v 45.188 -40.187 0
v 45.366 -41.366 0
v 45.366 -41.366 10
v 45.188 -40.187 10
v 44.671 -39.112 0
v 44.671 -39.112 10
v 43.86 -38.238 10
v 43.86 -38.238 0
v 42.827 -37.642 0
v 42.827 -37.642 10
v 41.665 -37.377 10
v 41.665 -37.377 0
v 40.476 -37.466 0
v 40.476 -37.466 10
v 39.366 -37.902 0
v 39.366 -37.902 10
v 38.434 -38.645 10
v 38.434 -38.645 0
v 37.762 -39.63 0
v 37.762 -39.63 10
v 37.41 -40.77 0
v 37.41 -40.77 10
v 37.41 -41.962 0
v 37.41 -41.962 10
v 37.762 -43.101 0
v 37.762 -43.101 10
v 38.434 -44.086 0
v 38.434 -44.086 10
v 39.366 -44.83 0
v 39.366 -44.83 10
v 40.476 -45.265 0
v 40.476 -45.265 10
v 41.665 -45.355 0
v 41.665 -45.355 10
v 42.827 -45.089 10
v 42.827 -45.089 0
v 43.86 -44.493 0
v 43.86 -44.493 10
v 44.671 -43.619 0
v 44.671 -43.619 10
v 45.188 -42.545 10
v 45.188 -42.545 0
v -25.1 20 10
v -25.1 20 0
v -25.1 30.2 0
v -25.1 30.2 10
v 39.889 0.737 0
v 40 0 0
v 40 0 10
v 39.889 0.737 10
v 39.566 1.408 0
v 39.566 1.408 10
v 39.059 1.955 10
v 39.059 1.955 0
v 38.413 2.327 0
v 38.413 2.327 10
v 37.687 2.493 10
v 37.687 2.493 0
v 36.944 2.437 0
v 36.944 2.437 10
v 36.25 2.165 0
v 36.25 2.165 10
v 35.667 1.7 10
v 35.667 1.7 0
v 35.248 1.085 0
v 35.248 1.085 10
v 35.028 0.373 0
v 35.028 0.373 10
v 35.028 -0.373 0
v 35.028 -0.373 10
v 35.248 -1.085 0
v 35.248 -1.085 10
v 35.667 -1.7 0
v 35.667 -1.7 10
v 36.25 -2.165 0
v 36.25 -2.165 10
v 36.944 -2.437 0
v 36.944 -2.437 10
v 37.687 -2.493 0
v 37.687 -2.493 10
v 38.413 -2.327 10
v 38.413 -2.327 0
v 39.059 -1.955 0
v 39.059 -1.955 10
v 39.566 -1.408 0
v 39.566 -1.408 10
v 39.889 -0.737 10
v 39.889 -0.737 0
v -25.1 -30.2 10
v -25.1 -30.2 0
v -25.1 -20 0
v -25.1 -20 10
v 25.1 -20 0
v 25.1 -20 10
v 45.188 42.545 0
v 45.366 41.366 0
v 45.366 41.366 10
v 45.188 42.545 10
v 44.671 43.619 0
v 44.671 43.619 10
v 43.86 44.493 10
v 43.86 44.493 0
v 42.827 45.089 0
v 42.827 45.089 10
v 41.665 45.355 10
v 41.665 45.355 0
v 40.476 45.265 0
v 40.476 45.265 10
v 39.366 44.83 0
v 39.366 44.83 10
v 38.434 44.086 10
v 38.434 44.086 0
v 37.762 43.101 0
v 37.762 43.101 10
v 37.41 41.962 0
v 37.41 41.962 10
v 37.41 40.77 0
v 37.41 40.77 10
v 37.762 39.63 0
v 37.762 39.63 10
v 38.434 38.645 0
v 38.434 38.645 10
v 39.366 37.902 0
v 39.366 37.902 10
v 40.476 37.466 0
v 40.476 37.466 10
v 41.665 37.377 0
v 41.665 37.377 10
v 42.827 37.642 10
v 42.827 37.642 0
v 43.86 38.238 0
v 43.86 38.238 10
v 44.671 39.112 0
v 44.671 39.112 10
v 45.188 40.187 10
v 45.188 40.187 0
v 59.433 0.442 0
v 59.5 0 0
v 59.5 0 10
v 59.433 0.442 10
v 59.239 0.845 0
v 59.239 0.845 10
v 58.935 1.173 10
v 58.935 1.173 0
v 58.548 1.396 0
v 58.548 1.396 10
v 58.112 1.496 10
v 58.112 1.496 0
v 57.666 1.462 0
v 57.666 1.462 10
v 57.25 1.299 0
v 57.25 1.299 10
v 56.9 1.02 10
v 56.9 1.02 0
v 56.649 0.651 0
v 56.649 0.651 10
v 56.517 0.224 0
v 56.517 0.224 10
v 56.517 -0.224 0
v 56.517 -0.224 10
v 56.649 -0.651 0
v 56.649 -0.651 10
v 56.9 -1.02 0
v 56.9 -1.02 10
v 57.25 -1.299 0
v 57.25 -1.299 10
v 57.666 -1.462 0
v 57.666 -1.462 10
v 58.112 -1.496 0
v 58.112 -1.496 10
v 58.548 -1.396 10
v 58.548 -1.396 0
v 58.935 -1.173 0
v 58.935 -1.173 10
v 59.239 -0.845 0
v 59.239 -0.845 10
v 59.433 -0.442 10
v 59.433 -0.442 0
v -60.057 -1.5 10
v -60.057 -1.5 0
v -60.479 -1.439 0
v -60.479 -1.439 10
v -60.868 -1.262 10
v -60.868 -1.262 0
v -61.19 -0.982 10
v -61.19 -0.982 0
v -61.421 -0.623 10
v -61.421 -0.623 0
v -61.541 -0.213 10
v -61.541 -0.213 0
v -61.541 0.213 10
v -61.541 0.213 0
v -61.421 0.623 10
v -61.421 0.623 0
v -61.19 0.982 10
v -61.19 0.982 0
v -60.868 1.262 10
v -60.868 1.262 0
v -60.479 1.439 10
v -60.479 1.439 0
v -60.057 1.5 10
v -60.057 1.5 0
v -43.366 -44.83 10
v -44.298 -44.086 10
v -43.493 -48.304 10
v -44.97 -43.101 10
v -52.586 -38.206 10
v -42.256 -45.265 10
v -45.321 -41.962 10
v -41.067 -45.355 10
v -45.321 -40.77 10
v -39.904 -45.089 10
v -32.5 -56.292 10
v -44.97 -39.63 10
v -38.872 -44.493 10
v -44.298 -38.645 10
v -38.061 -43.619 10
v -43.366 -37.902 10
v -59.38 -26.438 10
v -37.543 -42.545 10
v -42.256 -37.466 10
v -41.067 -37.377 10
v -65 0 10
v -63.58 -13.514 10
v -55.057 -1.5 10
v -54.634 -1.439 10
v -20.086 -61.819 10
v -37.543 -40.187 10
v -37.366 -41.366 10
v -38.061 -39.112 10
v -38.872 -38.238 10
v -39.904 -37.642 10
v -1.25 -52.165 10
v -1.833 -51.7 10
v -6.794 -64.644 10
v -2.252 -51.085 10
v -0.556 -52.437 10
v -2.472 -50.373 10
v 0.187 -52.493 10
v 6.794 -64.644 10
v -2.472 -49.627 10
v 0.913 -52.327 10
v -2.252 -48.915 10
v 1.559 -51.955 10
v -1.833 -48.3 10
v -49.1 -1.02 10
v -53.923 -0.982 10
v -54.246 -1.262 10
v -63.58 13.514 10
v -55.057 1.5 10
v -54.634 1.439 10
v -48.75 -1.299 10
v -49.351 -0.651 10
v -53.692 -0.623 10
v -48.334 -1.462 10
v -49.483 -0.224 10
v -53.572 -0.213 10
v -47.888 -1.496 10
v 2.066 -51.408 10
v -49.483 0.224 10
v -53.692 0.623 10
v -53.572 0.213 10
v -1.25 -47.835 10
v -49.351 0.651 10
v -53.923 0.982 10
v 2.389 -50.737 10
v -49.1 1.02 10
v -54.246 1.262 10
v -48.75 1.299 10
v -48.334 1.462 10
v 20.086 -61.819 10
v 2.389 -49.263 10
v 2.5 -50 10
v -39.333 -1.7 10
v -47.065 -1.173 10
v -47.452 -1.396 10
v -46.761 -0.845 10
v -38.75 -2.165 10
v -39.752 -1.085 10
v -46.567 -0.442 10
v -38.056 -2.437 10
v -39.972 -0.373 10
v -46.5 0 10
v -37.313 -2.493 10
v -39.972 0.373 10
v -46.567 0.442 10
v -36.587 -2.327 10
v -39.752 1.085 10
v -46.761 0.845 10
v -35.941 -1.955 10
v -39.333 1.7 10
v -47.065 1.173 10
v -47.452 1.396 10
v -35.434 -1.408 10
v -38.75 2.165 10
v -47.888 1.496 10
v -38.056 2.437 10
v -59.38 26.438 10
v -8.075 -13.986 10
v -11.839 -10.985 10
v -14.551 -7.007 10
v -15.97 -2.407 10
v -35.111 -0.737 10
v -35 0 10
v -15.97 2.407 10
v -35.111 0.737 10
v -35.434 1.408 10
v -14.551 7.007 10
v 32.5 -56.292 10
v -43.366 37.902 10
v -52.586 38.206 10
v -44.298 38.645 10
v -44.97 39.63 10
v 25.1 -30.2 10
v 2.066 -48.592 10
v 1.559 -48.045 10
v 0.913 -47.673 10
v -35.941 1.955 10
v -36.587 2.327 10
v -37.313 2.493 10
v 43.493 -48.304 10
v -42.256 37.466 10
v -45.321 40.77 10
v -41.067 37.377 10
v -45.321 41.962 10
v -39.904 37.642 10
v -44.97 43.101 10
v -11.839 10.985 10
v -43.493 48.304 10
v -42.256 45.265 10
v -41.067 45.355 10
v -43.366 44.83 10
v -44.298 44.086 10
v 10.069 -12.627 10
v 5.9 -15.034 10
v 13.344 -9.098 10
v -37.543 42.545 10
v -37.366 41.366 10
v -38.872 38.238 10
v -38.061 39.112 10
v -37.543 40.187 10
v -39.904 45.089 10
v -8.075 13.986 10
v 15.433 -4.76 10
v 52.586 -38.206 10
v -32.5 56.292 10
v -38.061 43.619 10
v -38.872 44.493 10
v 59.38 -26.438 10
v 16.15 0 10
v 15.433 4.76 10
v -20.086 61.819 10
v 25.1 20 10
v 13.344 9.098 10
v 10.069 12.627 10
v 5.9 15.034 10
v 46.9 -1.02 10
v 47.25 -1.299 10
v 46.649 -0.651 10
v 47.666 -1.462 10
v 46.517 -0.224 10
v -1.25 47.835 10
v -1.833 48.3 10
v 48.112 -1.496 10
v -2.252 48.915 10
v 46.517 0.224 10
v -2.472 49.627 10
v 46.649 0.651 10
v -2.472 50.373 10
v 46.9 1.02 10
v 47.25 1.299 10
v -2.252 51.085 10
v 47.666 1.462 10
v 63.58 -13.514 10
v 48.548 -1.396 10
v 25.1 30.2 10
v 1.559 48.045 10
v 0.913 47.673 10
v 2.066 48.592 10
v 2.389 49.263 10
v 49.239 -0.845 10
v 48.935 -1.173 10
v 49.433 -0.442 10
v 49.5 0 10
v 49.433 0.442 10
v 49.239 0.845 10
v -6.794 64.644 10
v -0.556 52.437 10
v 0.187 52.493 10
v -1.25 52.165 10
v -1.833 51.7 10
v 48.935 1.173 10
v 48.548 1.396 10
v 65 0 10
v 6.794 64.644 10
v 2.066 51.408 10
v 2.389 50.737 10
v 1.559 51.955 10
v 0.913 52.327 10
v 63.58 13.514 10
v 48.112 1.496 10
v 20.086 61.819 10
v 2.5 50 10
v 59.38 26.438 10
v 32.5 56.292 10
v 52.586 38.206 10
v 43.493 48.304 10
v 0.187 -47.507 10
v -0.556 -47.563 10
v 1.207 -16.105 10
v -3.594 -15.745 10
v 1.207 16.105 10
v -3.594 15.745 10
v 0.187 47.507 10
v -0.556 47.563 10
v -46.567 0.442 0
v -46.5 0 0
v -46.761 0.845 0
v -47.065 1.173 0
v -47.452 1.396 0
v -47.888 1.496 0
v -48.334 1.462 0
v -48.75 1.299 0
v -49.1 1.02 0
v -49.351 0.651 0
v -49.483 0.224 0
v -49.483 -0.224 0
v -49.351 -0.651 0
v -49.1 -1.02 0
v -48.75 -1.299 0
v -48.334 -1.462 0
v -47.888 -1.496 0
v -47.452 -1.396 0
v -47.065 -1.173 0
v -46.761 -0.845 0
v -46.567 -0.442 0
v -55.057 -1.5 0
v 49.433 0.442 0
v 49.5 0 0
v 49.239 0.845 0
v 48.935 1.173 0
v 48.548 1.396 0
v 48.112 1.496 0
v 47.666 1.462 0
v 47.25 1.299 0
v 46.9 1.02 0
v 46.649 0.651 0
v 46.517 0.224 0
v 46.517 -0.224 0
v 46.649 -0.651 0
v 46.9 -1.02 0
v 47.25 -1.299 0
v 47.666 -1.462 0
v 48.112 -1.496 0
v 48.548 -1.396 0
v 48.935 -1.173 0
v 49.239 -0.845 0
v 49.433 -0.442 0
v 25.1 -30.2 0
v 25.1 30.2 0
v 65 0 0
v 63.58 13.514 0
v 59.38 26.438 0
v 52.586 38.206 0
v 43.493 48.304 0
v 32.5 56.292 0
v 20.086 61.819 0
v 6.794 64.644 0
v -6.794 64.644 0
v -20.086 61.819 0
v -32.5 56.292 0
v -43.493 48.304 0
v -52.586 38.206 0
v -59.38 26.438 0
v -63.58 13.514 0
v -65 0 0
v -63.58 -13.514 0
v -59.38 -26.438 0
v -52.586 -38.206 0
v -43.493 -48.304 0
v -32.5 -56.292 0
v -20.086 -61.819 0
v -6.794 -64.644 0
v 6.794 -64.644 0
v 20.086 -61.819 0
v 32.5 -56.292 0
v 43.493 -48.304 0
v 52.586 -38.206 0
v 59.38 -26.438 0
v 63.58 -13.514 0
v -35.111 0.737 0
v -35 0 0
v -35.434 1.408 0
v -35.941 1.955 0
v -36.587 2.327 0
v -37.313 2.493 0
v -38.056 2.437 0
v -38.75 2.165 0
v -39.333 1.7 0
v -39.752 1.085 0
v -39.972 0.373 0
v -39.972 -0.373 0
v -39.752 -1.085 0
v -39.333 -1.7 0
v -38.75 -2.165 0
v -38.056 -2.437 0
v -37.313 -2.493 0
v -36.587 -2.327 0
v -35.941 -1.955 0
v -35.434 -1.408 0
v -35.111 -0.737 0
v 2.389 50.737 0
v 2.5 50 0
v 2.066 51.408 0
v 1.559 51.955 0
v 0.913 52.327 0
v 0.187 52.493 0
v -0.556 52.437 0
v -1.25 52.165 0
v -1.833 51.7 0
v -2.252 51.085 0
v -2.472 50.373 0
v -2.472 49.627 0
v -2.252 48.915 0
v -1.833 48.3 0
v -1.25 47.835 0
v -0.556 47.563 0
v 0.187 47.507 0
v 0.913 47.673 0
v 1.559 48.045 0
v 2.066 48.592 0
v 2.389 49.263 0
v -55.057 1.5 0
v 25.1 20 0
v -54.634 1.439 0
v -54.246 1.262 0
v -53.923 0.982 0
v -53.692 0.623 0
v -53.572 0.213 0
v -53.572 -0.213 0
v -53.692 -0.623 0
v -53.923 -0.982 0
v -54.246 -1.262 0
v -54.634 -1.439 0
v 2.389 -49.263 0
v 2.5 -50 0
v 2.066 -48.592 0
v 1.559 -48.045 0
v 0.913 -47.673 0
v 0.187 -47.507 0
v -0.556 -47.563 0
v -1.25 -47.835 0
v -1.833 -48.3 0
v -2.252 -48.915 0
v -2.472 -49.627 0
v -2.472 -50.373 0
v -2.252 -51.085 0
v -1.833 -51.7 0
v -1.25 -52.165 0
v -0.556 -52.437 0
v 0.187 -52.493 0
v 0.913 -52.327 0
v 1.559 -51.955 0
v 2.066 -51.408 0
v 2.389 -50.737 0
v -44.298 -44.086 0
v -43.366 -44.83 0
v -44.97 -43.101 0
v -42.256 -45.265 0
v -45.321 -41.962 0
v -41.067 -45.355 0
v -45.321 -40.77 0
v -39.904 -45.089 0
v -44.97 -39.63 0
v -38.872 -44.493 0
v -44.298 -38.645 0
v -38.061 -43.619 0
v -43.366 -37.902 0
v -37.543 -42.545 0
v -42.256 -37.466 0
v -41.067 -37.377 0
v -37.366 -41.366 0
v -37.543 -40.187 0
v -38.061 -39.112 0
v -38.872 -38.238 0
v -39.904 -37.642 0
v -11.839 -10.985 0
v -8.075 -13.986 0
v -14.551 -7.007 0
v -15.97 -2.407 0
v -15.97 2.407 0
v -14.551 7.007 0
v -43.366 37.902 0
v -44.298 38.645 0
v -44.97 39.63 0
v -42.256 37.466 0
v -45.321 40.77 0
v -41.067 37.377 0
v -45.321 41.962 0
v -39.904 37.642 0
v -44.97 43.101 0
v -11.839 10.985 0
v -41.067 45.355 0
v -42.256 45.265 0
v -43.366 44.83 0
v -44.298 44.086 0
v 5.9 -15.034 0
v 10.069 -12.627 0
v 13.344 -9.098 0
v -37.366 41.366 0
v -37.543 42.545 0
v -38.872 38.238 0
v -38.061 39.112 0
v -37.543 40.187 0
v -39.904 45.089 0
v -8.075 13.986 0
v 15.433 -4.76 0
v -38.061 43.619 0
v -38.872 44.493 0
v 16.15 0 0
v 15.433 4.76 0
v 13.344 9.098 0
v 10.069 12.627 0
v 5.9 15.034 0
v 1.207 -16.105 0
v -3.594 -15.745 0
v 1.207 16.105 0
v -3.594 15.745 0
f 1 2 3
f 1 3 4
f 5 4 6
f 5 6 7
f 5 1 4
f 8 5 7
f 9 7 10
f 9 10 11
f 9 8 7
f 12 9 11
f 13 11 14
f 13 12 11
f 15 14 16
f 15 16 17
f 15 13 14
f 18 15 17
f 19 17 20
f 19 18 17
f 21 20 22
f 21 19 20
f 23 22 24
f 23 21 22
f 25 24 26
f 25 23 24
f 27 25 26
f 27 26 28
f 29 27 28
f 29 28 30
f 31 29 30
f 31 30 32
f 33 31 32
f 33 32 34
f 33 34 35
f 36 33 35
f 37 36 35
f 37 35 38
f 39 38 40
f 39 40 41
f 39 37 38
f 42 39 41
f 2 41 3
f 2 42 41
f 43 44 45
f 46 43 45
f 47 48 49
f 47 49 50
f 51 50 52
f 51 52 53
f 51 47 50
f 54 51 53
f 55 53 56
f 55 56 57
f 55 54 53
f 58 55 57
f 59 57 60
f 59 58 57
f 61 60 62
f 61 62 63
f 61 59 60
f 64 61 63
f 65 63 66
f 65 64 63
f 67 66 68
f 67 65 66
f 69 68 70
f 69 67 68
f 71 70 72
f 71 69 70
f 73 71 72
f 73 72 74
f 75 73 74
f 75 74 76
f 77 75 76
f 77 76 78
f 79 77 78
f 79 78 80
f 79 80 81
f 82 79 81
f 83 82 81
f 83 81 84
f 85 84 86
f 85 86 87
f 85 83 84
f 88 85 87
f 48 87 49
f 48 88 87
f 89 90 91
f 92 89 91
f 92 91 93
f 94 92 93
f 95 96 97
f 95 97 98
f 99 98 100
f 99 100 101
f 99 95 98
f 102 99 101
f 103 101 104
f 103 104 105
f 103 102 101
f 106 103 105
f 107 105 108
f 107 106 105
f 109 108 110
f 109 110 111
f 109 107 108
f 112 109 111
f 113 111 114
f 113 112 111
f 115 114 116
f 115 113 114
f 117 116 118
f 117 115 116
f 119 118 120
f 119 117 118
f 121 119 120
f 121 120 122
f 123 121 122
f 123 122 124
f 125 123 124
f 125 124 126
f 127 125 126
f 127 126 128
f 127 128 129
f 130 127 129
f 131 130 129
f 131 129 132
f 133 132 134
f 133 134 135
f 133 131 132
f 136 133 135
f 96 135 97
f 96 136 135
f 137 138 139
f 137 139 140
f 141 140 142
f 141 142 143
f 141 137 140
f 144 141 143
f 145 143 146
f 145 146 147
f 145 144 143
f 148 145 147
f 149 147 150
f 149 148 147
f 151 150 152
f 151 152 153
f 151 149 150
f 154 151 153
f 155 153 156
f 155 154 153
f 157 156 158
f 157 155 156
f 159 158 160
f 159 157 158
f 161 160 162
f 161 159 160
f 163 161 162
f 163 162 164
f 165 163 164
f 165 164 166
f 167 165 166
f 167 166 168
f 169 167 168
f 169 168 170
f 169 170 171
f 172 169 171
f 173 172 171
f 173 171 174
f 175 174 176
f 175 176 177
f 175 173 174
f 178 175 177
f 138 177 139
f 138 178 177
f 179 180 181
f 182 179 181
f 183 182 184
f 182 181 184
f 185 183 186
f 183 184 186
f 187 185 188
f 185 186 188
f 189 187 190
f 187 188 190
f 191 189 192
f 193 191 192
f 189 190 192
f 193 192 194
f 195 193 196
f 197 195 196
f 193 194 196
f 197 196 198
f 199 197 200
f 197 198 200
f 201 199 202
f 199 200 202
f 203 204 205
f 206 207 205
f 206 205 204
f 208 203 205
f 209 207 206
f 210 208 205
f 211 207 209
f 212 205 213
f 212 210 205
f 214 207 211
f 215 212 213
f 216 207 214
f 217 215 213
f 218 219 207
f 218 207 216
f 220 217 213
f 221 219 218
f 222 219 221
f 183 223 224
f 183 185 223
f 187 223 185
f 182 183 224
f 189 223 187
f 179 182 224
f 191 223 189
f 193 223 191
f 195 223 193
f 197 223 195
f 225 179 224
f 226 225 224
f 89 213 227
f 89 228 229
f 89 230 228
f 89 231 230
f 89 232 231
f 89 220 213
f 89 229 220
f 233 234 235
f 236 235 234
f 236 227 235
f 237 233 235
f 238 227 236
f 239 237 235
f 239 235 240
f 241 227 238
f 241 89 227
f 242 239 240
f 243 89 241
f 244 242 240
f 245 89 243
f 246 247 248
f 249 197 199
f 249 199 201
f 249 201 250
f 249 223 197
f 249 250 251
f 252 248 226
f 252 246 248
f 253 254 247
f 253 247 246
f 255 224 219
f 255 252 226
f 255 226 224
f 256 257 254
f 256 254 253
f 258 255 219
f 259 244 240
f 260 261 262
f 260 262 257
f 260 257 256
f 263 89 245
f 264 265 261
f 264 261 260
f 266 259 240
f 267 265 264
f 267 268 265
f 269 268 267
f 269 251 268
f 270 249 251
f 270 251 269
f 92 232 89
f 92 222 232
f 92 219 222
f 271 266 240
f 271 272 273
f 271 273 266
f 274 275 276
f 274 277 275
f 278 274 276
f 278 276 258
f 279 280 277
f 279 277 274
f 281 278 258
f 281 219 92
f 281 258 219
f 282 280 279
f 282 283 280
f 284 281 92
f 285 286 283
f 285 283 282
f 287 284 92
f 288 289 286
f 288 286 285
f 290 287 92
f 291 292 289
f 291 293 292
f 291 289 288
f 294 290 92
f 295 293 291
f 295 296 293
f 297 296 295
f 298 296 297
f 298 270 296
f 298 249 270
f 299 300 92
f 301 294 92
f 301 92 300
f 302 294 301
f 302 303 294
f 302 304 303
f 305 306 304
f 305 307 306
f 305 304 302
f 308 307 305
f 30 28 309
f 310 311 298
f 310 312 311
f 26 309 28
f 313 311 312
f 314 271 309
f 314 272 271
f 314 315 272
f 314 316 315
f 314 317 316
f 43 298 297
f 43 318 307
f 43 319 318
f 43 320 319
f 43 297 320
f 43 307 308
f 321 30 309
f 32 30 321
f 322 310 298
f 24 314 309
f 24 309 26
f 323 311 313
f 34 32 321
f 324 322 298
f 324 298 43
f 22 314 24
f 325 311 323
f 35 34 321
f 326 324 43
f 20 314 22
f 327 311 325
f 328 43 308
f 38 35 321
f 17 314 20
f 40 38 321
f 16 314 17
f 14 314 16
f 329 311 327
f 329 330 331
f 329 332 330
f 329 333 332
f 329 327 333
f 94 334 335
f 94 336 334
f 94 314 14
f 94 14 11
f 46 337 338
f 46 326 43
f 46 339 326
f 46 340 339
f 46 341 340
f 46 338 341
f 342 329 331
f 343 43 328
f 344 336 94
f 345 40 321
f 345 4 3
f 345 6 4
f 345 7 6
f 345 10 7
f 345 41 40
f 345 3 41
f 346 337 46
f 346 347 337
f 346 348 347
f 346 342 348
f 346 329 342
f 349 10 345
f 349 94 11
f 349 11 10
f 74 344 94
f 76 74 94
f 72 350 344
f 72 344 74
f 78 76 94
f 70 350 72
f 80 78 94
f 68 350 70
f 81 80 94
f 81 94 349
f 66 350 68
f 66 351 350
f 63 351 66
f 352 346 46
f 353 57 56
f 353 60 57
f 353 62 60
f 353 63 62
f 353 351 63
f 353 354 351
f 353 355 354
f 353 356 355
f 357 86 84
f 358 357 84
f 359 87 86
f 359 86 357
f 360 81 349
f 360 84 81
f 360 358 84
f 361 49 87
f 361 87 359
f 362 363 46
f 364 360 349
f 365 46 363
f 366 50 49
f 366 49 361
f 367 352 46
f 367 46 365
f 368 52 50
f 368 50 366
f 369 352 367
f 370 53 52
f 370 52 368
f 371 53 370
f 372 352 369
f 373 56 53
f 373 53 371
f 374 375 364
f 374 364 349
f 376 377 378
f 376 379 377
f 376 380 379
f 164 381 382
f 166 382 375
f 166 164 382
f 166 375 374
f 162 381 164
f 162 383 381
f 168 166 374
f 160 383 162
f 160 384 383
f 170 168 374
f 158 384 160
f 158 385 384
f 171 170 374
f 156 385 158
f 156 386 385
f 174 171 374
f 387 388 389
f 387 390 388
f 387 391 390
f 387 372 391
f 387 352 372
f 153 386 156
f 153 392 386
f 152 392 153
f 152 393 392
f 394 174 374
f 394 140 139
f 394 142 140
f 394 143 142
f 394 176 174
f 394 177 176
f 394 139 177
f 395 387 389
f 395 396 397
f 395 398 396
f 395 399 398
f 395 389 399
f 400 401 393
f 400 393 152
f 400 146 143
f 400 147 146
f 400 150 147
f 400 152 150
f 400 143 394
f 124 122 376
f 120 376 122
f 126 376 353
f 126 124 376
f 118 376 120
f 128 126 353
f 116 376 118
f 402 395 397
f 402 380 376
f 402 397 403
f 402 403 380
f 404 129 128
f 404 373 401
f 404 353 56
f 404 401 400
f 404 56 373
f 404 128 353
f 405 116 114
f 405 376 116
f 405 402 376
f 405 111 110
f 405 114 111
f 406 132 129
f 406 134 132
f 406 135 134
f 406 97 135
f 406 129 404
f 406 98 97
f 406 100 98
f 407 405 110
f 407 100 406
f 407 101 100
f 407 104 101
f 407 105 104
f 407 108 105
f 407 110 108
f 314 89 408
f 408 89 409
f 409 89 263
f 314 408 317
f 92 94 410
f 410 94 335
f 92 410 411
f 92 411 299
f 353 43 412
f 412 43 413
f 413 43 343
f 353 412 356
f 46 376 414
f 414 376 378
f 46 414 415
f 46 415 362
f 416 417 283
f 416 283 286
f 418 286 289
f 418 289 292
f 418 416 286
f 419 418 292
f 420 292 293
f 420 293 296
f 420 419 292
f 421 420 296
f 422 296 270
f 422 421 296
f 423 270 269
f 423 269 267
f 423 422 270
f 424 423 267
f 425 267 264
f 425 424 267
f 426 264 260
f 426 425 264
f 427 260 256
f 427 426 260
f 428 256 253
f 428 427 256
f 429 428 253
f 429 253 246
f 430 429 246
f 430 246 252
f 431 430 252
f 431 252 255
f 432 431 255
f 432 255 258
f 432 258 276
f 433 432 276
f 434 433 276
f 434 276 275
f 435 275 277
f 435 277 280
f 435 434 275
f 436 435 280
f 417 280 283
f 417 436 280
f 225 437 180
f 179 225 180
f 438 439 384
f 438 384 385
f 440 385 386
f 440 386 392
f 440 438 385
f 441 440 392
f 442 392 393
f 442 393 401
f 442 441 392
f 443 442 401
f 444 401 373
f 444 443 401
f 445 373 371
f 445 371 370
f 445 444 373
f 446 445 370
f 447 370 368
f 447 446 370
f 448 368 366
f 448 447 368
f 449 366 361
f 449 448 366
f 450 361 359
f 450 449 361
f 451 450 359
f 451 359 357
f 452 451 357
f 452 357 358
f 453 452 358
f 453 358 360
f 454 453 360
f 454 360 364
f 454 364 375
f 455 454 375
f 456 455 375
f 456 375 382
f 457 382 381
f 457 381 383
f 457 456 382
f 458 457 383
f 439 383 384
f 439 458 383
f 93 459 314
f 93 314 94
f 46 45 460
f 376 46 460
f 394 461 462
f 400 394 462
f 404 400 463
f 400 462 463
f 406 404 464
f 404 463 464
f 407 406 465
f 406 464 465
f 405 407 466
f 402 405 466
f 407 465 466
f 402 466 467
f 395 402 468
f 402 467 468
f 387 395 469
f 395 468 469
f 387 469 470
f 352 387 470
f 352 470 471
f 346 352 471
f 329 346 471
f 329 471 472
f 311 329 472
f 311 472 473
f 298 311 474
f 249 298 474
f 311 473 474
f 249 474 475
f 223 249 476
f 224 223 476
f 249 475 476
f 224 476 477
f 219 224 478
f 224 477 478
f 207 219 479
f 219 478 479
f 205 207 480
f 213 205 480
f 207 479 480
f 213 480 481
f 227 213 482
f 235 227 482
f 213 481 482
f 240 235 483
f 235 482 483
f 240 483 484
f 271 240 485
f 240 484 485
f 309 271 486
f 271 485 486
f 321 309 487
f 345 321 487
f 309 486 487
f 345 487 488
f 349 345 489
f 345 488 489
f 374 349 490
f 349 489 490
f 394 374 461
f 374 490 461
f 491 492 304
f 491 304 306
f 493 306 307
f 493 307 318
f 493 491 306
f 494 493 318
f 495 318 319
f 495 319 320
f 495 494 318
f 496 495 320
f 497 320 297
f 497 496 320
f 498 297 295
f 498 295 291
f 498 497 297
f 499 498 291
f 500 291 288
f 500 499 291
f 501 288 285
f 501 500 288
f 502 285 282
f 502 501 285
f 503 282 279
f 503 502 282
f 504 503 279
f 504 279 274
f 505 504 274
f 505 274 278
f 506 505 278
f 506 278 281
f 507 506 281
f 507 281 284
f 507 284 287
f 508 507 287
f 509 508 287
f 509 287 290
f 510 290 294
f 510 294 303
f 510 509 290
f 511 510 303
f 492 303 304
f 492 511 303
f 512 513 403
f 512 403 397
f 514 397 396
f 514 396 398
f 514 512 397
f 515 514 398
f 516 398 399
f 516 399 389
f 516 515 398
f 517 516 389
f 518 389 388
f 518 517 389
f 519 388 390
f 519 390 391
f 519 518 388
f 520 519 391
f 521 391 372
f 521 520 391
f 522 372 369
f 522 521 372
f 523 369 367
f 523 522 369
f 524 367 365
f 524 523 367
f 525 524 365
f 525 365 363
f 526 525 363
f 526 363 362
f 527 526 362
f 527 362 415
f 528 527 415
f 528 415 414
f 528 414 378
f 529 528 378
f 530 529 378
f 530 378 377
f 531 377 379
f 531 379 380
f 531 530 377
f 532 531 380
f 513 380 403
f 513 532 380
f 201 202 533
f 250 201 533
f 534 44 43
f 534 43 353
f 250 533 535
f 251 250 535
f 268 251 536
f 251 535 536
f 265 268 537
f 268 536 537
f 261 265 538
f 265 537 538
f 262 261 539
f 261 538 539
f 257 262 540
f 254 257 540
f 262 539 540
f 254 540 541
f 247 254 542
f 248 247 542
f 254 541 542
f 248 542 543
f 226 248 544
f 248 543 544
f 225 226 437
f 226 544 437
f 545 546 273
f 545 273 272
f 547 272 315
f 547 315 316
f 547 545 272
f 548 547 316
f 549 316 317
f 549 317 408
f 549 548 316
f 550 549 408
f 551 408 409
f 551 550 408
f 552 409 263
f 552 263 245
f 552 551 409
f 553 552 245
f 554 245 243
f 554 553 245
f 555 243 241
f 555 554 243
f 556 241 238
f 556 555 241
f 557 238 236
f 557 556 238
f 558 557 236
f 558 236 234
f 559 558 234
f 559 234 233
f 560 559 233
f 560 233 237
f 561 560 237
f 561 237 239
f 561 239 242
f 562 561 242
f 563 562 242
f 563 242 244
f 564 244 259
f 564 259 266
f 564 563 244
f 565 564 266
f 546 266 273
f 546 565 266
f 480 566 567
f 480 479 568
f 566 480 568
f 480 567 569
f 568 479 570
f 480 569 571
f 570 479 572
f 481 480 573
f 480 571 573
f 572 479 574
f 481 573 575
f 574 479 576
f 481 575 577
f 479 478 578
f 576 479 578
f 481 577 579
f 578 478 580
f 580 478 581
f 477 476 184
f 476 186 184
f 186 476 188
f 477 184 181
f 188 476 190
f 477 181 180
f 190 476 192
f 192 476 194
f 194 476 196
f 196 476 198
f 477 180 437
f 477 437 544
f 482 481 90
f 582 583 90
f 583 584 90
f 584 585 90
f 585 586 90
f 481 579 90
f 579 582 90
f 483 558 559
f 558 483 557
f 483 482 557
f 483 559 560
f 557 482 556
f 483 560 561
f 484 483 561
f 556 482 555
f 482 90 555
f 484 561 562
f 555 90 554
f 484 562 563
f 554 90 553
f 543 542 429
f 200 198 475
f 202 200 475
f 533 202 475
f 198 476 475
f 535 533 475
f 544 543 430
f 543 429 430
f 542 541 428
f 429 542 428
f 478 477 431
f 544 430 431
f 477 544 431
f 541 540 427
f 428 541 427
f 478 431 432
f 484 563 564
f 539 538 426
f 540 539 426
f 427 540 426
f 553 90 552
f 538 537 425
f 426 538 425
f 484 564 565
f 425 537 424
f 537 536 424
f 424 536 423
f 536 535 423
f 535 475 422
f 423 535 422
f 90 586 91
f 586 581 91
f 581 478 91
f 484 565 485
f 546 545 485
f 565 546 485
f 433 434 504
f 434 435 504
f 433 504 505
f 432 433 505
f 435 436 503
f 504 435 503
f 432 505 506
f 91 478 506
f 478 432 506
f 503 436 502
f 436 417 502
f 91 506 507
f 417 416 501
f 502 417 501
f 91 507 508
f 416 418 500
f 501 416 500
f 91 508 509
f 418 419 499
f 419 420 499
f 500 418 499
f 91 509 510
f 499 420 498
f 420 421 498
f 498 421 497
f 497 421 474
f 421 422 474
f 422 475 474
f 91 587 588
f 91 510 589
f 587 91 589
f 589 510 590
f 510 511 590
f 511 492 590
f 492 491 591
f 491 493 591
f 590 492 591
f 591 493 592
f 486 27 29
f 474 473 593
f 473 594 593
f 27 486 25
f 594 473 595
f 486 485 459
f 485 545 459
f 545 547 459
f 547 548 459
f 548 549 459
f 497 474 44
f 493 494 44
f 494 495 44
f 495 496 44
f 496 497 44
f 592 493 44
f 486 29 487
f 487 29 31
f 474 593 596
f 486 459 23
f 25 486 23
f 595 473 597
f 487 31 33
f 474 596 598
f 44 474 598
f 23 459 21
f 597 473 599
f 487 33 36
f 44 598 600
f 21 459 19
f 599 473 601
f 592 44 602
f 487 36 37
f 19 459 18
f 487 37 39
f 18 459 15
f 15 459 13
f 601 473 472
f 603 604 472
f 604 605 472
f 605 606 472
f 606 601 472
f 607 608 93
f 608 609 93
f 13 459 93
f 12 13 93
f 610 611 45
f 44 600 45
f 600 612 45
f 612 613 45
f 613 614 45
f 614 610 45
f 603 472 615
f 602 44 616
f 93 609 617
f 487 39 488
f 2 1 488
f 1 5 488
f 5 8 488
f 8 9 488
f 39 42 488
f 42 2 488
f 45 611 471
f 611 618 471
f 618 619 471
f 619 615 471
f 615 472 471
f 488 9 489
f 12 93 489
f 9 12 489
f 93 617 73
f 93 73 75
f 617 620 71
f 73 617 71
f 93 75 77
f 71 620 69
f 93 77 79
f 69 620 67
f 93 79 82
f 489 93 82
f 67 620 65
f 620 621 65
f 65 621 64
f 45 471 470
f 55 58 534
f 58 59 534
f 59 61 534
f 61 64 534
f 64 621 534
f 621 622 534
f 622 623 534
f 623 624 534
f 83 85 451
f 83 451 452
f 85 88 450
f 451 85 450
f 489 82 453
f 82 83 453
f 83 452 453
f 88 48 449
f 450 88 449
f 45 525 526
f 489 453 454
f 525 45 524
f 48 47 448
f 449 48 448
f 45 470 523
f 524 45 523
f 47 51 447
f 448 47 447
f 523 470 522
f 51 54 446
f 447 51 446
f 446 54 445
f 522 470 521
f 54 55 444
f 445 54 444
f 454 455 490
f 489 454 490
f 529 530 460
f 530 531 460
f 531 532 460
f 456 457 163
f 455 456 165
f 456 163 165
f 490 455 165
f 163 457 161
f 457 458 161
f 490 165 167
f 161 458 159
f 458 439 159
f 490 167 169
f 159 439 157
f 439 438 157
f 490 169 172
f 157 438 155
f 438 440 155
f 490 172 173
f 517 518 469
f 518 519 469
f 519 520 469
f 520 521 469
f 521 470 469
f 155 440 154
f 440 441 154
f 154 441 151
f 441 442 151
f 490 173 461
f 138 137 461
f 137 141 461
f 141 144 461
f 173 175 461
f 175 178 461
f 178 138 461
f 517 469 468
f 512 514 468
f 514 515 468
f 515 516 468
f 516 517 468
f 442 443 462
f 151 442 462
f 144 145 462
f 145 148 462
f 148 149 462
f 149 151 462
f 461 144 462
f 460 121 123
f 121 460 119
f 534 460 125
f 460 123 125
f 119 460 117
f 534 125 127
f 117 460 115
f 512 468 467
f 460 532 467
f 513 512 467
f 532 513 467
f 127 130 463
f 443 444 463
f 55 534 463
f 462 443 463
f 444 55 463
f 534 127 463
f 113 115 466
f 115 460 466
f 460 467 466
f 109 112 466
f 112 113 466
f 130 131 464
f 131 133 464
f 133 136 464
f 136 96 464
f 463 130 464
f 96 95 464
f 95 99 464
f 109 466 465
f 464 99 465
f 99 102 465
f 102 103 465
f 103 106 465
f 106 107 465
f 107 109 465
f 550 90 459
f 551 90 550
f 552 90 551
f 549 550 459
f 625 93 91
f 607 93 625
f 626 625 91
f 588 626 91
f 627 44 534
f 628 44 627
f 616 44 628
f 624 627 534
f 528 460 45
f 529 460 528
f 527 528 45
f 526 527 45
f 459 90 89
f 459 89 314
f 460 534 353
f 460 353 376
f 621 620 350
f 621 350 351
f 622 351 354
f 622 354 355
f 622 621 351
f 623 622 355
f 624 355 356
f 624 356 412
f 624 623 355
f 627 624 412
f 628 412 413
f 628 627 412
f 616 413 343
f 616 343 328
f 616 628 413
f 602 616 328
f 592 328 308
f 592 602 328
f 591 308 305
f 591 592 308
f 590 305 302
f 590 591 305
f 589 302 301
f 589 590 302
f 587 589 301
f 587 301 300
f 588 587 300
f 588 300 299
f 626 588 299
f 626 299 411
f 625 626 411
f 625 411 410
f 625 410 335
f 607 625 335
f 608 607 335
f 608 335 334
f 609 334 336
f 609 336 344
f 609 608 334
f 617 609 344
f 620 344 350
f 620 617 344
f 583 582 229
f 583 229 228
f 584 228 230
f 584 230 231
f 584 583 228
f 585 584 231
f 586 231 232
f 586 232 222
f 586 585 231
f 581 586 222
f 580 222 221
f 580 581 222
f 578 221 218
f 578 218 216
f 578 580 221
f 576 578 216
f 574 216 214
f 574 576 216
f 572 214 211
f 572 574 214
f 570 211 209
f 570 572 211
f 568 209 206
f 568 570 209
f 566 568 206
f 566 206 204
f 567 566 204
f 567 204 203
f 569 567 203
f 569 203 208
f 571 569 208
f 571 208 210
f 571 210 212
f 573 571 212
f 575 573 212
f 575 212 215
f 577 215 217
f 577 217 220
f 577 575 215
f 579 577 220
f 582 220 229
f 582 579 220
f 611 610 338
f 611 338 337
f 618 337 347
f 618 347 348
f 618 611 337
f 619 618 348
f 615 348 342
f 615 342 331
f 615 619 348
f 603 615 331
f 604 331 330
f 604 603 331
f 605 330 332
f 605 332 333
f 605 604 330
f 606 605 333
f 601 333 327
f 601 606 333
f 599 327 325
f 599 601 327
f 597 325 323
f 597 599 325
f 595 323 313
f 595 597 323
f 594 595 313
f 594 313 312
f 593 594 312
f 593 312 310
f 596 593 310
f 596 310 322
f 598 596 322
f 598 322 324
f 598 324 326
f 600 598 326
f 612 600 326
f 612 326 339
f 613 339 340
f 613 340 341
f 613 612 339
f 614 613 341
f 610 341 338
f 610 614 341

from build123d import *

# Parameters (mm, degrees)
SKETCH1_R           = 65
SKETCH1_R_2         = 2.5
SKETCH1_R_3         = 16.15
SKETCH1_R_4         = 4
SKETCH1_R_5         = 1.5
SKETCH1_W           = 50.2
SKETCH1_H           = 10.2
BOSS_EXTRUDE1_DEPTH = 10


with BuildPart() as part:
    # Sketch1 → Boss-Extrude1 (new body)
    with BuildSketch(Plane.XY):
        Circle(SKETCH1_R)
        with Locations((-37.5, 0)):
            Circle(SKETCH1_R_2, mode=Mode.SUBTRACT)
        with Locations((37.5, 0)):
            Circle(SKETCH1_R_2, mode=Mode.SUBTRACT)
        with Locations((0, 50)):
            Circle(SKETCH1_R_2, mode=Mode.SUBTRACT)
        with Locations((0, -50)):
            Circle(SKETCH1_R_2, mode=Mode.SUBTRACT)
        Circle(SKETCH1_R_3, mode=Mode.SUBTRACT)
        with Locations((-41.365746699, 41.365746699)):
            Circle(SKETCH1_R_4, mode=Mode.SUBTRACT)
        with Locations((41.365746699, -41.365746699)):
            Circle(SKETCH1_R_4, mode=Mode.SUBTRACT)
        with Locations((41.365746699, 41.365746699)):
            Circle(SKETCH1_R_4, mode=Mode.SUBTRACT)
        with Locations((-41.365746699, -41.365746699)):
            Circle(SKETCH1_R_4, mode=Mode.SUBTRACT)
        with Locations((48, 0)):
            Circle(SKETCH1_R_5, mode=Mode.SUBTRACT)
        with Locations((58, 0)):
            Circle(SKETCH1_R_5, mode=Mode.SUBTRACT)
        with Locations((-48, 0)):
            Circle(SKETCH1_R_5, mode=Mode.SUBTRACT)
        with Locations((0, -25.1)):
            Rectangle(SKETCH1_W, SKETCH1_H, mode=Mode.SUBTRACT)
        with BuildLine():
            Line((-55.056563459, -1.5), (-60.056563459, -1.5))
            ThreePointArc((-60.056563459, -1.5), (-61.556563459, 0), (-60.056563459, 1.5))
            Line((-60.056563459, 1.5), (-55.056563459, 1.5))
            ThreePointArc((-55.056563459, 1.5), (-53.556563459, 0), (-55.056563459, -1.5))
        make_face(mode=Mode.SUBTRACT)
        with Locations((0, 25.1)):
            Rectangle(SKETCH1_W, SKETCH1_H, mode=Mode.SUBTRACT)
    extrude(amount=BOSS_EXTRUDE1_DEPTH)


solid = part.part
